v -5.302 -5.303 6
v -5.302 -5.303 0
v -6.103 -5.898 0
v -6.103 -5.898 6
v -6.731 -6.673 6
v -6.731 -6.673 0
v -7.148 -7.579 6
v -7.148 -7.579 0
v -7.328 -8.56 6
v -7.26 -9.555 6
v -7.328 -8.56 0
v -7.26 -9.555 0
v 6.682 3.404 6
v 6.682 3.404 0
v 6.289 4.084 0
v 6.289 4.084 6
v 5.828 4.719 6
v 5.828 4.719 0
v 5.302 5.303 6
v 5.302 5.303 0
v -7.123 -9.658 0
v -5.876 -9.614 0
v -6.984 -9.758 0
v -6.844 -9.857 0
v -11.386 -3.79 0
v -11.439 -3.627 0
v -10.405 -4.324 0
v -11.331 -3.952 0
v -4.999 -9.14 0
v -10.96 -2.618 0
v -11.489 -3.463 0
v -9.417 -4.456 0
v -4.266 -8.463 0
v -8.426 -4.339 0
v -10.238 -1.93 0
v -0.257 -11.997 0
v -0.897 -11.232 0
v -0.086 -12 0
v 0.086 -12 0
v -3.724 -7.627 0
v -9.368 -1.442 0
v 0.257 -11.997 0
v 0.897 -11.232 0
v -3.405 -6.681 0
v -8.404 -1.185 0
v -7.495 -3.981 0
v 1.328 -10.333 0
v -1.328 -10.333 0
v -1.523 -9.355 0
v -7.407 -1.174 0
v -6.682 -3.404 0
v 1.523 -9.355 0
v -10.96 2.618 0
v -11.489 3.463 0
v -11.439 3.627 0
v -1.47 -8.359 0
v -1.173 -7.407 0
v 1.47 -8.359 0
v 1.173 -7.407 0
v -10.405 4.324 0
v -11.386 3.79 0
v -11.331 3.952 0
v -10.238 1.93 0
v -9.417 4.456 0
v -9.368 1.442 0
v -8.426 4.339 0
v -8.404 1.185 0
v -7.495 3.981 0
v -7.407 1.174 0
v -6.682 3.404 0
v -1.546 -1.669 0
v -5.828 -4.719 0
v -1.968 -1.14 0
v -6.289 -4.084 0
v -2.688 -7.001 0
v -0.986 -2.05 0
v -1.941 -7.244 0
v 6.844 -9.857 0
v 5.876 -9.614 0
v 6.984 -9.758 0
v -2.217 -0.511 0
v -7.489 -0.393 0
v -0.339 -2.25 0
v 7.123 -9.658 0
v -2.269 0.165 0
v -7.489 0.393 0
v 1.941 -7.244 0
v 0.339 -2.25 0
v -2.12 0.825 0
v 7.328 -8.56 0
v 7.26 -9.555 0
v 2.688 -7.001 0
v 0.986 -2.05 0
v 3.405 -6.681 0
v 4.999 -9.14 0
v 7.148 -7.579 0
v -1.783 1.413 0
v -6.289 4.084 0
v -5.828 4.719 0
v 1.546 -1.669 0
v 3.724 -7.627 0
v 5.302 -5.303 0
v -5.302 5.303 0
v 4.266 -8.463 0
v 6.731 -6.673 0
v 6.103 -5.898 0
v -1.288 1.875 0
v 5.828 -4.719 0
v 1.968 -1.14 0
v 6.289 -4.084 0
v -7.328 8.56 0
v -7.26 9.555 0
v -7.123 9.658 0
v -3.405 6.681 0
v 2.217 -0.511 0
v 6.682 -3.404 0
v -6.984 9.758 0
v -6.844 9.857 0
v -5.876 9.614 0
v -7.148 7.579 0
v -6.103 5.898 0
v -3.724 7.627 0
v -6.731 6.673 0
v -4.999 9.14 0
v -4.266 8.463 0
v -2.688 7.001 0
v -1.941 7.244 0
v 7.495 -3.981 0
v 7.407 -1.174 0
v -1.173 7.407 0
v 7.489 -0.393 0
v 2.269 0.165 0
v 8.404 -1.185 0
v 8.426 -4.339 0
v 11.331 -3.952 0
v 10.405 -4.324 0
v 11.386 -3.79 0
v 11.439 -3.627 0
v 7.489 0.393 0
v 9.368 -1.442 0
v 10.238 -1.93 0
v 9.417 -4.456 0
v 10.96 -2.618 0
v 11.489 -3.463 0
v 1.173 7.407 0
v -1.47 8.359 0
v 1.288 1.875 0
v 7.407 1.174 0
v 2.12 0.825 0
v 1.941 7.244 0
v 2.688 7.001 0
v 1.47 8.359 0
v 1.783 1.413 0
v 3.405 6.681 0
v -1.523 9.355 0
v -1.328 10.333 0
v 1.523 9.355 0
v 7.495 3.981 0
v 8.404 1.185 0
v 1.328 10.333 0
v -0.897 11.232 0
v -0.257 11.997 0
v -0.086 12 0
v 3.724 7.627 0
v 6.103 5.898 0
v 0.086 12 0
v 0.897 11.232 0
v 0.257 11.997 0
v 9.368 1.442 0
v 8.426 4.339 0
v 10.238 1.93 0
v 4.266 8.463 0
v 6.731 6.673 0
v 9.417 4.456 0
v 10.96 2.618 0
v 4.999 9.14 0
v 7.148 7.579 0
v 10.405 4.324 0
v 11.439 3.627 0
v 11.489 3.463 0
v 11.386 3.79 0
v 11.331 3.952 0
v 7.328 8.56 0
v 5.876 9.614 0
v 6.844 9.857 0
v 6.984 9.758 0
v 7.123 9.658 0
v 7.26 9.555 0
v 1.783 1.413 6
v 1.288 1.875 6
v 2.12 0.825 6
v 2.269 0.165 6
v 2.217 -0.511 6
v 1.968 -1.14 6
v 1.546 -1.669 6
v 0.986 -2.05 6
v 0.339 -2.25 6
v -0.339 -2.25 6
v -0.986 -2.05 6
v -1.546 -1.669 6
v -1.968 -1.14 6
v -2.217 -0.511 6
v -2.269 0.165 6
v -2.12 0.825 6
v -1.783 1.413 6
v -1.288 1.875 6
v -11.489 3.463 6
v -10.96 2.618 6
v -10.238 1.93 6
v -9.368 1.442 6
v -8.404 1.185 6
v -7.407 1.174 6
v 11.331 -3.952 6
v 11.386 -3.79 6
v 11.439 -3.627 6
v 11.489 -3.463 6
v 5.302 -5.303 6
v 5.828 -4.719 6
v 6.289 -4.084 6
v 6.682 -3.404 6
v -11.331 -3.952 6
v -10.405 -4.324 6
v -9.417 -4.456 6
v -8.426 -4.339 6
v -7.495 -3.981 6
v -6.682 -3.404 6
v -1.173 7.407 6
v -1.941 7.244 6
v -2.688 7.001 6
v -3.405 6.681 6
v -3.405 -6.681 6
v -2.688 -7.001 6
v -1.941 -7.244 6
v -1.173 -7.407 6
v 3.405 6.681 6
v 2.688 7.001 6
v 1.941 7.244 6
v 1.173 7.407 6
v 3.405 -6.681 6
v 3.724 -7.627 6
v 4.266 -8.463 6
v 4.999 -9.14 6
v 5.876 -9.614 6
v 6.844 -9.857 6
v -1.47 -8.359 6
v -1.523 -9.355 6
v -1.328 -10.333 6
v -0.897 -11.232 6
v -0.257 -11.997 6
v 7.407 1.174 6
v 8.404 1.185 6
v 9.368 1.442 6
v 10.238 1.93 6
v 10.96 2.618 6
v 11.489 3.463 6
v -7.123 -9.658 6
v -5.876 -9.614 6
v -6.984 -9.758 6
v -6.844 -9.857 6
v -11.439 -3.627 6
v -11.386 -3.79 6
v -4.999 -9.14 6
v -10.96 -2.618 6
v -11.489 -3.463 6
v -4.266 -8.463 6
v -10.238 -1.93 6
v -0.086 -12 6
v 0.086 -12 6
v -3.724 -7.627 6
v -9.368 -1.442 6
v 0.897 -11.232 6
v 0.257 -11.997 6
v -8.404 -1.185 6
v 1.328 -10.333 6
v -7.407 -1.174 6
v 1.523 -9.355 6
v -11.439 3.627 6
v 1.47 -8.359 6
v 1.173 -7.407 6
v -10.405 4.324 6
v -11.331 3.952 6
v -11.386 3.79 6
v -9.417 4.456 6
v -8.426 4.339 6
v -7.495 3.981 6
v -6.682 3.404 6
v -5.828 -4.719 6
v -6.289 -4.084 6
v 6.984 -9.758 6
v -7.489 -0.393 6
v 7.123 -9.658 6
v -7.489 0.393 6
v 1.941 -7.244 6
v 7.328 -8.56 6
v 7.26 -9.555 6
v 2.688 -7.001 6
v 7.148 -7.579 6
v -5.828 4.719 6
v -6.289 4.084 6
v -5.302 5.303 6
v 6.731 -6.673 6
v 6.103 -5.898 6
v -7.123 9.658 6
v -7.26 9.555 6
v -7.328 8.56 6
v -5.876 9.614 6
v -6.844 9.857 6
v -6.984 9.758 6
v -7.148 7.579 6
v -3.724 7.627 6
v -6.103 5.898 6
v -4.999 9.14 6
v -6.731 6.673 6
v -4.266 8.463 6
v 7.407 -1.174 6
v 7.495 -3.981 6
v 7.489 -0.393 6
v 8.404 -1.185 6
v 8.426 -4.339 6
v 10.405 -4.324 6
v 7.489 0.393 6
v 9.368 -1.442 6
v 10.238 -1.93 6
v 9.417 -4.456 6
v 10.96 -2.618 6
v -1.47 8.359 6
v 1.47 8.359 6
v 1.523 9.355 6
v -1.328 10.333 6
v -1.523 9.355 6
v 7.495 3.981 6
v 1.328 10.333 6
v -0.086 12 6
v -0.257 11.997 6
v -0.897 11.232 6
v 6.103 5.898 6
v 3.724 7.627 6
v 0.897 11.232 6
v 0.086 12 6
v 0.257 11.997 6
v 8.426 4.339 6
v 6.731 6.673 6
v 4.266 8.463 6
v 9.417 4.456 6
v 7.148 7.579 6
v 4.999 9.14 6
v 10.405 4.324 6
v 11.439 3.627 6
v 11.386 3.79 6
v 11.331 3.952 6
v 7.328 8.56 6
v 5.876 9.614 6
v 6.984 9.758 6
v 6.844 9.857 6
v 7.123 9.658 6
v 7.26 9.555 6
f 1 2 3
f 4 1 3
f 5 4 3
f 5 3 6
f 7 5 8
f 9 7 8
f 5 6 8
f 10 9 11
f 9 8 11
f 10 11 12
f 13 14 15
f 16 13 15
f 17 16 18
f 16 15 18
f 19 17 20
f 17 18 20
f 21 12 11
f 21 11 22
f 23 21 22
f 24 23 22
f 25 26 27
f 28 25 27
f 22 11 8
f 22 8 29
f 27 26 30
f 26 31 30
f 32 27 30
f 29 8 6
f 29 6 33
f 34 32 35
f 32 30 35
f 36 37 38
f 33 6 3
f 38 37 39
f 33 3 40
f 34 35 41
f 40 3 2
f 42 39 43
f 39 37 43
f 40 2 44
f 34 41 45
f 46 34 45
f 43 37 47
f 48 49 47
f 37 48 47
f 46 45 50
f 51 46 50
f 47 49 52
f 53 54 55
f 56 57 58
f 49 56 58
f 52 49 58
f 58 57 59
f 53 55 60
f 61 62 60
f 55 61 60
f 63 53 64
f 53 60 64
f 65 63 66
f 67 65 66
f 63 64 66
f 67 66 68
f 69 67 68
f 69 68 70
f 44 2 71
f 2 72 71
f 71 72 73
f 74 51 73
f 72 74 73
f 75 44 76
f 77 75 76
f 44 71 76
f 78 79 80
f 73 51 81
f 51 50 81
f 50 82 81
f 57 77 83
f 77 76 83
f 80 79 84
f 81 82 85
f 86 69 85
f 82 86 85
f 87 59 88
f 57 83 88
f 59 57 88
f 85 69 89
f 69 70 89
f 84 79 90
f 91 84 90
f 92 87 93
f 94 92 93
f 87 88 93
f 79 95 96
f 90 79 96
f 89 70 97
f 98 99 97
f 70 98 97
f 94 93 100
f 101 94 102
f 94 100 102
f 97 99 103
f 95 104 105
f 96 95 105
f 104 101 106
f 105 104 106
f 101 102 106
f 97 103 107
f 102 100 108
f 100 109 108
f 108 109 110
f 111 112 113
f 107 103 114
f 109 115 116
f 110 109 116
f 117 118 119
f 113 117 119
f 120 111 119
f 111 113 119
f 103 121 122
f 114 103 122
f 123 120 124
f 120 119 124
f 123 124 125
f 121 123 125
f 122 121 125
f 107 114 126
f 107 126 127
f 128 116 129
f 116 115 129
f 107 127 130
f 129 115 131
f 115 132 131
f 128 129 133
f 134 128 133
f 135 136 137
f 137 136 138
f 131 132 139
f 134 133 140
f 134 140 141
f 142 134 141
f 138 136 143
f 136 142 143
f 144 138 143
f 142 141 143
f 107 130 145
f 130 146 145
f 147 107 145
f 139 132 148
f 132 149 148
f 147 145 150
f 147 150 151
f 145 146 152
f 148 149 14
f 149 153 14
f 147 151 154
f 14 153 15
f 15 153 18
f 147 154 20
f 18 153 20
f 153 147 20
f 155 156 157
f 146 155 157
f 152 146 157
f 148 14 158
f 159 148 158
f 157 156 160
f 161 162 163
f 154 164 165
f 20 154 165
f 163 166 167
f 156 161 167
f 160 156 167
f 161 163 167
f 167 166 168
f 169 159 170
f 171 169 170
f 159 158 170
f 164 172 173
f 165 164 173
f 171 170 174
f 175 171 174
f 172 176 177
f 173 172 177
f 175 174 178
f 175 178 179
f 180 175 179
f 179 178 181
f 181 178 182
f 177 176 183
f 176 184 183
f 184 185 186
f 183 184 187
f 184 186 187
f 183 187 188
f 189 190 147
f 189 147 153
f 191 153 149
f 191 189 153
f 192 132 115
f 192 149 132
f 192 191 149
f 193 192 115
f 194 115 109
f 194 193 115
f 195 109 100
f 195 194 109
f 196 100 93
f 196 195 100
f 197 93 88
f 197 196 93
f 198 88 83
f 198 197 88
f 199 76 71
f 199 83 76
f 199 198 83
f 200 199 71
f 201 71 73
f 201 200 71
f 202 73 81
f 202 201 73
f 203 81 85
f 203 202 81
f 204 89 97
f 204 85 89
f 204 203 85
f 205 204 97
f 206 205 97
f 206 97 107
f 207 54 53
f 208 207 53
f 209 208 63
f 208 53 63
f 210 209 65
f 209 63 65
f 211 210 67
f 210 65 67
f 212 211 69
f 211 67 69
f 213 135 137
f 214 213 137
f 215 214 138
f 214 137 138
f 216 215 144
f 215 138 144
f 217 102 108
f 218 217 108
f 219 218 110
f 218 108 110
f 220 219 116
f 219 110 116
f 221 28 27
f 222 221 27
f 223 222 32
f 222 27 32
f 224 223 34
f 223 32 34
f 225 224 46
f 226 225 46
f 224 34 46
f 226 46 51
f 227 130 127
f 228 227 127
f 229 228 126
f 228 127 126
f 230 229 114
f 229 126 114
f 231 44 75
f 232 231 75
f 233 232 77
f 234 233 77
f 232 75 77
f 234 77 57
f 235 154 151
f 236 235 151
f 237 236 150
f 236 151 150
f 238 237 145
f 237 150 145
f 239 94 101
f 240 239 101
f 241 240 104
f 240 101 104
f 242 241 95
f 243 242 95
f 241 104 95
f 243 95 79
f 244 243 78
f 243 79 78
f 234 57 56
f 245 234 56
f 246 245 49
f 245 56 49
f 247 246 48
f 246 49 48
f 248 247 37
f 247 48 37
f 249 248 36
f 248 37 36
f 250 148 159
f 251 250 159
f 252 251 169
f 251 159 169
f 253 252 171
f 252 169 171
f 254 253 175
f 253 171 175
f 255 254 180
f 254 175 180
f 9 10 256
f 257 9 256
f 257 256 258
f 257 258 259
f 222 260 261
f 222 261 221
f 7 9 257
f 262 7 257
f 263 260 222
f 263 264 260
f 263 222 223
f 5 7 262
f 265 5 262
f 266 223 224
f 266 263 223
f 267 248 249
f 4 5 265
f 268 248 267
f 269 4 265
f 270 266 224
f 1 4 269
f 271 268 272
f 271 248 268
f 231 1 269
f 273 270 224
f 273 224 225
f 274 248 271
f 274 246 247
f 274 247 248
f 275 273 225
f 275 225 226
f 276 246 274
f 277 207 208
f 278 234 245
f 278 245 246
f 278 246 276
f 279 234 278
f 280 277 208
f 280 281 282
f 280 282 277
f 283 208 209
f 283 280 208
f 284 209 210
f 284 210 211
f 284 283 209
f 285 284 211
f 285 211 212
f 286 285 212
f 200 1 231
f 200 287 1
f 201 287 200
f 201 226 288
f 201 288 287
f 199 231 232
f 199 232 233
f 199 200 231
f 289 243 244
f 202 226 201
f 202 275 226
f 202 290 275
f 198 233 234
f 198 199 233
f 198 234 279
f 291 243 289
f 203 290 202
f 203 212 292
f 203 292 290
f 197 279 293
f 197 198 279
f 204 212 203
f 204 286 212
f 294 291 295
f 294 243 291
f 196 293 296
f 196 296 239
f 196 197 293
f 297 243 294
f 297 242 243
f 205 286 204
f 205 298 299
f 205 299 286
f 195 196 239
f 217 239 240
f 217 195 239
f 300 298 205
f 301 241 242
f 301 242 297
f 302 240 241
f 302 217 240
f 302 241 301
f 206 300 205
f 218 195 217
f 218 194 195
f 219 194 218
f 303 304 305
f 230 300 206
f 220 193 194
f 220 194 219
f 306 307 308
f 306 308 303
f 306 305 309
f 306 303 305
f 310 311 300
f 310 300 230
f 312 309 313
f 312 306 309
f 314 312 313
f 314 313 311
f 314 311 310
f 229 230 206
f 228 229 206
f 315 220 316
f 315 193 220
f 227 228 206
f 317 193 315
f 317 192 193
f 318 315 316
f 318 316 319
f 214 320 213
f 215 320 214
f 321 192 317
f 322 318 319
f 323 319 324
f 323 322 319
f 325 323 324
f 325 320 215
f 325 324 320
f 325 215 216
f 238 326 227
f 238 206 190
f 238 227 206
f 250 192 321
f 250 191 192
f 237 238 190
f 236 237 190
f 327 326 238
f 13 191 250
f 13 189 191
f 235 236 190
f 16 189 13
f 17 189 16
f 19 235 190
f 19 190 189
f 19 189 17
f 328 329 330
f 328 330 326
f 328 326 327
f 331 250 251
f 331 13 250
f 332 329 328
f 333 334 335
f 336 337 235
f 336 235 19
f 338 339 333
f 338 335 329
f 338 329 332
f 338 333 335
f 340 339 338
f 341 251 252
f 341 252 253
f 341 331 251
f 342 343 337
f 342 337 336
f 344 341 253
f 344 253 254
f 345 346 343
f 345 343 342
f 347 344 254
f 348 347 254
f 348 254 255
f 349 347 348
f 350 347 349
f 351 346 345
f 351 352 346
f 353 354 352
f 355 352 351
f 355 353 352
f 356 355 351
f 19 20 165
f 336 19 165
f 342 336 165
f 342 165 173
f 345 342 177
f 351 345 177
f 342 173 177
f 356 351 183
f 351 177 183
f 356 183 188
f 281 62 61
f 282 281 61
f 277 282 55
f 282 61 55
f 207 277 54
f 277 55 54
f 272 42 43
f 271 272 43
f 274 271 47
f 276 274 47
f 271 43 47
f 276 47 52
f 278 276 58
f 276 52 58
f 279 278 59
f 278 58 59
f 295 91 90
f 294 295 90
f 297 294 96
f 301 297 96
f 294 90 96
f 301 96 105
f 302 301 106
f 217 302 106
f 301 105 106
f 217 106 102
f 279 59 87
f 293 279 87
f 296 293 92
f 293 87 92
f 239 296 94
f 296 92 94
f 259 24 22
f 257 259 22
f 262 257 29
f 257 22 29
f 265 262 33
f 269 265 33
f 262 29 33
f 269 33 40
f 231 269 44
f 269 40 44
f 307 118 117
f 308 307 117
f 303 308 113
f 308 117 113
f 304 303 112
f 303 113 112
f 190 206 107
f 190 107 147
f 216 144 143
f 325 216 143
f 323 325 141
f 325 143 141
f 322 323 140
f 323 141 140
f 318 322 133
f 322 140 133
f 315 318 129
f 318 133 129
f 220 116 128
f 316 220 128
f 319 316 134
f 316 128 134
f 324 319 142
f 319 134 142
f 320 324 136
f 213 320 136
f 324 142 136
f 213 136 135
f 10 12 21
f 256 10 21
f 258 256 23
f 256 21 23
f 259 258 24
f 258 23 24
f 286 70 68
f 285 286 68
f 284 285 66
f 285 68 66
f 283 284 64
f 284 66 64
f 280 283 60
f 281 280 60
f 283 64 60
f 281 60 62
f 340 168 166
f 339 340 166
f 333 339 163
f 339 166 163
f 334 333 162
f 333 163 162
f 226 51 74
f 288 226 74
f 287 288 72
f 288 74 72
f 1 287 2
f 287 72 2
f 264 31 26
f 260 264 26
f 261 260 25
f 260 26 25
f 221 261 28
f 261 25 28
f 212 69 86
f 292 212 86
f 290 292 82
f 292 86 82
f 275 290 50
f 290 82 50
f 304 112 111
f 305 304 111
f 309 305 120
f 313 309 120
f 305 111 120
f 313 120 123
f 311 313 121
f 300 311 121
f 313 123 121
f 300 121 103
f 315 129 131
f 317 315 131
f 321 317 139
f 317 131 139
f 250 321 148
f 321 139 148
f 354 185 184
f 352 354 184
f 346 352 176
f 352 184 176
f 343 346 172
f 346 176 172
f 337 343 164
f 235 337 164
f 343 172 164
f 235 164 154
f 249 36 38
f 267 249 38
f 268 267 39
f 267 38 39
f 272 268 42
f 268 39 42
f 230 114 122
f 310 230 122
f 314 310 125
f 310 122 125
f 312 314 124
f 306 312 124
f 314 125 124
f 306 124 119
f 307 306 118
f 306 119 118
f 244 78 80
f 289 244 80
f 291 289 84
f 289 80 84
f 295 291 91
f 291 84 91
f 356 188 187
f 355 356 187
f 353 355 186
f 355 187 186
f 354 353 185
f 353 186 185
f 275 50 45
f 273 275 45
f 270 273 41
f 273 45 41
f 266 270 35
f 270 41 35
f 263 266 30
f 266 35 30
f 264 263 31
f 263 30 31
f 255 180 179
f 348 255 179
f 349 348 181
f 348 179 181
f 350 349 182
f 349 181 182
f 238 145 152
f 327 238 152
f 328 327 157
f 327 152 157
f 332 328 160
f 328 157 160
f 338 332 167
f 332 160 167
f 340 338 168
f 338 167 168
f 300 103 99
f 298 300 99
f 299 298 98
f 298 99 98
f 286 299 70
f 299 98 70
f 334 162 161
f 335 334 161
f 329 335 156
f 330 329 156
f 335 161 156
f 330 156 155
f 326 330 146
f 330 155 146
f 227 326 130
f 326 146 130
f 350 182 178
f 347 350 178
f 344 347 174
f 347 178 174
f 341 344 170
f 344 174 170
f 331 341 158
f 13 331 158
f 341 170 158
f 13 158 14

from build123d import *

# Parameters (mm, degrees)
SKETCH4_R           = 2
BOSS_EXTRUDE3_DEPTH = 6
SKETCH6_R           = 3.276903459
BOSS_EXTRUDE4_DEPTH = 6
CUT_EXTRUDE1_DEPTH  = 10


with BuildPart() as part:
    # Sketch4 → Boss-Extrude3 (new body)
    with BuildSketch(Plane.XY):
        with BuildLine():
            ThreePointArc((11.330682707, 3.9516616), (8.917819898, 4.428819506), (6.681915604, 3.403968986))
            ThreePointArc((6.681915604, 3.403968986), (6.066818441, 4.407801607), (5.302192362, 5.302995112))
            ThreePointArc((5.302192362, 5.302995112), (6.967815552, 7.112770233), (7.259627029, 9.554989032))
            ThreePointArc((7.259627029, 9.554989032), (7.053423028, 9.708203932), (6.843986457, 9.856969584))
            ThreePointArc((6.843986457, 9.856969584), (4.61147306, 8.824753264), (3.40498051, 6.681400208))
            ThreePointArc((3.40498051, 6.681400208), (2.317318441, 7.131972816), (1.172541409, 7.406763642))
            ThreePointArc((1.172541409, 7.406763642), (1.456299749, 9.849931218), (0.256880001, 11.997250213))
            ThreePointArc((0.256880001, 11.997250213), (0, 12), (-0.256880001, 11.997250213))
            ThreePointArc((-0.256880001, 11.997250213), (-1.456299749, 9.849931218), (-1.172541409, 7.406763642))
            ThreePointArc((-1.172541409, 7.406763642), (-2.317318441, 7.131972816), (-3.404980509, 6.681400207))
            ThreePointArc((-3.404980509, 6.681400207), (-4.61147306, 8.824753264), (-6.843986457, 9.856969584))
            ThreePointArc((-6.843986457, 9.856969584), (-7.053423028, 9.708203933), (-7.259627029, 9.554989032))
            ThreePointArc((-7.259627029, 9.554989032), (-6.967815552, 7.112770233), (-5.302192362, 5.302995112))
            ThreePointArc((-5.302192362, 5.302995112), (-6.066818441, 4.407801607), (-6.681915604, 3.403968986))
            ThreePointArc((-6.681915604, 3.403968986), (-8.917819898, 4.428819506), (-11.330682707, 3.9516616))
            ThreePointArc((-11.330682707, 3.9516616), (-11.412678196, 3.708203933), (-11.489443278, 3.463046803))
            ThreePointArc((-11.489443278, 3.463046803), (-9.817862641, 1.658772773), (-7.406586048, 1.173662691))
            ThreePointArc((-7.406586048, 1.173662691), (-7.499, 0), (-7.406586048, -1.173662691))
            ThreePointArc((-7.406586048, -1.173662691), (-9.817862641, -1.658772773), (-11.489443278, -3.463046803))
            ThreePointArc((-11.489443278, -3.463046803), (-11.412678196, -3.708203933), (-11.330682707, -3.9516616))
            ThreePointArc((-11.330682707, -3.9516616), (-8.917819898, -4.428819506), (-6.681915604, -3.403968986))
            ThreePointArc((-6.681915604, -3.403968986), (-6.066818441, -4.407801607), (-5.302192362, -5.302995112))
            ThreePointArc((-5.302192362, -5.302995112), (-6.967815552, -7.112770233), (-7.259627029, -9.554989032))
            ThreePointArc((-7.259627029, -9.554989032), (-7.053423028, -9.708203932), (-6.843986457, -9.856969584))
            ThreePointArc((-6.843986457, -9.856969584), (-4.61147306, -8.824753264), (-3.404980509, -6.681400207))
            ThreePointArc((-3.404980509, -6.681400207), (-2.317318441, -7.131972816), (-1.172541409, -7.406763642))
            ThreePointArc((-1.172541409, -7.406763642), (-1.456299749, -9.849931218), (-0.256880001, -11.997250213))
            ThreePointArc((-0.256880001, -11.997250213), (0, -12), (0.256880001, -11.997250213))
            ThreePointArc((0.256880001, -11.997250213), (1.456299749, -9.849931218), (1.172541409, -7.406763642))
            ThreePointArc((1.172541409, -7.406763642), (2.317318441, -7.131972816), (3.404980509, -6.681400207))
            ThreePointArc((3.404980509, -6.681400207), (4.61147306, -8.824753264), (6.843986457, -9.856969584))
            ThreePointArc((6.843986457, -9.856969584), (7.053423027, -9.708203933), (7.259627029, -9.554989032))
            ThreePointArc((7.259627029, -9.554989032), (6.967815552, -7.112770233), (5.302192362, -5.302995112))
            ThreePointArc((5.302192362, -5.302995112), (6.066818441, -4.407801607), (6.681915604, -3.403968986))
            ThreePointArc((6.681915604, -3.403968986), (8.917819898, -4.428819506), (11.330682707, -3.9516616))
            ThreePointArc((11.330682707, -3.9516616), (11.412678196, -3.708203932), (11.489443278, -3.463046803))
            ThreePointArc((11.489443278, -3.463046803), (9.817862641, -1.658772773), (7.406586048, -1.173662691))
            ThreePointArc((7.406586048, -1.173662691), (7.499, 0), (7.406586048, 1.173662691))
            ThreePointArc((7.406586048, 1.173662691), (9.817862641, 1.658772773), (11.489443278, 3.463046803))
            ThreePointArc((11.489443278, 3.463046803), (11.412678196, 3.708203932), (11.330682707, 3.9516616))
        make_face()
        Circle(SKETCH4_R, mode=Mode.SUBTRACT)
    extrude(amount=BOSS_EXTRUDE3_DEPTH)

    # Sketch6 → Boss-Extrude4 (add)
    with BuildSketch(Plane.XY.offset(6)):
        Circle(SKETCH6_R)
    extrude(amount=-BOSS_EXTRUDE4_DEPTH)

    # Sketch7 → Cut-Extrude1 (cut)
    with BuildSketch(Plane.XY.offset(6)):
        with BuildLine():
            Line((-1.288409873, 1.875), (1.288409873, 1.875))
            ThreePointArc((1.288409873, 1.875), (0, -2.275), (-1.288409873, 1.875))
        make_face()
    extrude(amount=-CUT_EXTRUDE1_DEPTH, mode=Mode.SUBTRACT)


solid = part.part
